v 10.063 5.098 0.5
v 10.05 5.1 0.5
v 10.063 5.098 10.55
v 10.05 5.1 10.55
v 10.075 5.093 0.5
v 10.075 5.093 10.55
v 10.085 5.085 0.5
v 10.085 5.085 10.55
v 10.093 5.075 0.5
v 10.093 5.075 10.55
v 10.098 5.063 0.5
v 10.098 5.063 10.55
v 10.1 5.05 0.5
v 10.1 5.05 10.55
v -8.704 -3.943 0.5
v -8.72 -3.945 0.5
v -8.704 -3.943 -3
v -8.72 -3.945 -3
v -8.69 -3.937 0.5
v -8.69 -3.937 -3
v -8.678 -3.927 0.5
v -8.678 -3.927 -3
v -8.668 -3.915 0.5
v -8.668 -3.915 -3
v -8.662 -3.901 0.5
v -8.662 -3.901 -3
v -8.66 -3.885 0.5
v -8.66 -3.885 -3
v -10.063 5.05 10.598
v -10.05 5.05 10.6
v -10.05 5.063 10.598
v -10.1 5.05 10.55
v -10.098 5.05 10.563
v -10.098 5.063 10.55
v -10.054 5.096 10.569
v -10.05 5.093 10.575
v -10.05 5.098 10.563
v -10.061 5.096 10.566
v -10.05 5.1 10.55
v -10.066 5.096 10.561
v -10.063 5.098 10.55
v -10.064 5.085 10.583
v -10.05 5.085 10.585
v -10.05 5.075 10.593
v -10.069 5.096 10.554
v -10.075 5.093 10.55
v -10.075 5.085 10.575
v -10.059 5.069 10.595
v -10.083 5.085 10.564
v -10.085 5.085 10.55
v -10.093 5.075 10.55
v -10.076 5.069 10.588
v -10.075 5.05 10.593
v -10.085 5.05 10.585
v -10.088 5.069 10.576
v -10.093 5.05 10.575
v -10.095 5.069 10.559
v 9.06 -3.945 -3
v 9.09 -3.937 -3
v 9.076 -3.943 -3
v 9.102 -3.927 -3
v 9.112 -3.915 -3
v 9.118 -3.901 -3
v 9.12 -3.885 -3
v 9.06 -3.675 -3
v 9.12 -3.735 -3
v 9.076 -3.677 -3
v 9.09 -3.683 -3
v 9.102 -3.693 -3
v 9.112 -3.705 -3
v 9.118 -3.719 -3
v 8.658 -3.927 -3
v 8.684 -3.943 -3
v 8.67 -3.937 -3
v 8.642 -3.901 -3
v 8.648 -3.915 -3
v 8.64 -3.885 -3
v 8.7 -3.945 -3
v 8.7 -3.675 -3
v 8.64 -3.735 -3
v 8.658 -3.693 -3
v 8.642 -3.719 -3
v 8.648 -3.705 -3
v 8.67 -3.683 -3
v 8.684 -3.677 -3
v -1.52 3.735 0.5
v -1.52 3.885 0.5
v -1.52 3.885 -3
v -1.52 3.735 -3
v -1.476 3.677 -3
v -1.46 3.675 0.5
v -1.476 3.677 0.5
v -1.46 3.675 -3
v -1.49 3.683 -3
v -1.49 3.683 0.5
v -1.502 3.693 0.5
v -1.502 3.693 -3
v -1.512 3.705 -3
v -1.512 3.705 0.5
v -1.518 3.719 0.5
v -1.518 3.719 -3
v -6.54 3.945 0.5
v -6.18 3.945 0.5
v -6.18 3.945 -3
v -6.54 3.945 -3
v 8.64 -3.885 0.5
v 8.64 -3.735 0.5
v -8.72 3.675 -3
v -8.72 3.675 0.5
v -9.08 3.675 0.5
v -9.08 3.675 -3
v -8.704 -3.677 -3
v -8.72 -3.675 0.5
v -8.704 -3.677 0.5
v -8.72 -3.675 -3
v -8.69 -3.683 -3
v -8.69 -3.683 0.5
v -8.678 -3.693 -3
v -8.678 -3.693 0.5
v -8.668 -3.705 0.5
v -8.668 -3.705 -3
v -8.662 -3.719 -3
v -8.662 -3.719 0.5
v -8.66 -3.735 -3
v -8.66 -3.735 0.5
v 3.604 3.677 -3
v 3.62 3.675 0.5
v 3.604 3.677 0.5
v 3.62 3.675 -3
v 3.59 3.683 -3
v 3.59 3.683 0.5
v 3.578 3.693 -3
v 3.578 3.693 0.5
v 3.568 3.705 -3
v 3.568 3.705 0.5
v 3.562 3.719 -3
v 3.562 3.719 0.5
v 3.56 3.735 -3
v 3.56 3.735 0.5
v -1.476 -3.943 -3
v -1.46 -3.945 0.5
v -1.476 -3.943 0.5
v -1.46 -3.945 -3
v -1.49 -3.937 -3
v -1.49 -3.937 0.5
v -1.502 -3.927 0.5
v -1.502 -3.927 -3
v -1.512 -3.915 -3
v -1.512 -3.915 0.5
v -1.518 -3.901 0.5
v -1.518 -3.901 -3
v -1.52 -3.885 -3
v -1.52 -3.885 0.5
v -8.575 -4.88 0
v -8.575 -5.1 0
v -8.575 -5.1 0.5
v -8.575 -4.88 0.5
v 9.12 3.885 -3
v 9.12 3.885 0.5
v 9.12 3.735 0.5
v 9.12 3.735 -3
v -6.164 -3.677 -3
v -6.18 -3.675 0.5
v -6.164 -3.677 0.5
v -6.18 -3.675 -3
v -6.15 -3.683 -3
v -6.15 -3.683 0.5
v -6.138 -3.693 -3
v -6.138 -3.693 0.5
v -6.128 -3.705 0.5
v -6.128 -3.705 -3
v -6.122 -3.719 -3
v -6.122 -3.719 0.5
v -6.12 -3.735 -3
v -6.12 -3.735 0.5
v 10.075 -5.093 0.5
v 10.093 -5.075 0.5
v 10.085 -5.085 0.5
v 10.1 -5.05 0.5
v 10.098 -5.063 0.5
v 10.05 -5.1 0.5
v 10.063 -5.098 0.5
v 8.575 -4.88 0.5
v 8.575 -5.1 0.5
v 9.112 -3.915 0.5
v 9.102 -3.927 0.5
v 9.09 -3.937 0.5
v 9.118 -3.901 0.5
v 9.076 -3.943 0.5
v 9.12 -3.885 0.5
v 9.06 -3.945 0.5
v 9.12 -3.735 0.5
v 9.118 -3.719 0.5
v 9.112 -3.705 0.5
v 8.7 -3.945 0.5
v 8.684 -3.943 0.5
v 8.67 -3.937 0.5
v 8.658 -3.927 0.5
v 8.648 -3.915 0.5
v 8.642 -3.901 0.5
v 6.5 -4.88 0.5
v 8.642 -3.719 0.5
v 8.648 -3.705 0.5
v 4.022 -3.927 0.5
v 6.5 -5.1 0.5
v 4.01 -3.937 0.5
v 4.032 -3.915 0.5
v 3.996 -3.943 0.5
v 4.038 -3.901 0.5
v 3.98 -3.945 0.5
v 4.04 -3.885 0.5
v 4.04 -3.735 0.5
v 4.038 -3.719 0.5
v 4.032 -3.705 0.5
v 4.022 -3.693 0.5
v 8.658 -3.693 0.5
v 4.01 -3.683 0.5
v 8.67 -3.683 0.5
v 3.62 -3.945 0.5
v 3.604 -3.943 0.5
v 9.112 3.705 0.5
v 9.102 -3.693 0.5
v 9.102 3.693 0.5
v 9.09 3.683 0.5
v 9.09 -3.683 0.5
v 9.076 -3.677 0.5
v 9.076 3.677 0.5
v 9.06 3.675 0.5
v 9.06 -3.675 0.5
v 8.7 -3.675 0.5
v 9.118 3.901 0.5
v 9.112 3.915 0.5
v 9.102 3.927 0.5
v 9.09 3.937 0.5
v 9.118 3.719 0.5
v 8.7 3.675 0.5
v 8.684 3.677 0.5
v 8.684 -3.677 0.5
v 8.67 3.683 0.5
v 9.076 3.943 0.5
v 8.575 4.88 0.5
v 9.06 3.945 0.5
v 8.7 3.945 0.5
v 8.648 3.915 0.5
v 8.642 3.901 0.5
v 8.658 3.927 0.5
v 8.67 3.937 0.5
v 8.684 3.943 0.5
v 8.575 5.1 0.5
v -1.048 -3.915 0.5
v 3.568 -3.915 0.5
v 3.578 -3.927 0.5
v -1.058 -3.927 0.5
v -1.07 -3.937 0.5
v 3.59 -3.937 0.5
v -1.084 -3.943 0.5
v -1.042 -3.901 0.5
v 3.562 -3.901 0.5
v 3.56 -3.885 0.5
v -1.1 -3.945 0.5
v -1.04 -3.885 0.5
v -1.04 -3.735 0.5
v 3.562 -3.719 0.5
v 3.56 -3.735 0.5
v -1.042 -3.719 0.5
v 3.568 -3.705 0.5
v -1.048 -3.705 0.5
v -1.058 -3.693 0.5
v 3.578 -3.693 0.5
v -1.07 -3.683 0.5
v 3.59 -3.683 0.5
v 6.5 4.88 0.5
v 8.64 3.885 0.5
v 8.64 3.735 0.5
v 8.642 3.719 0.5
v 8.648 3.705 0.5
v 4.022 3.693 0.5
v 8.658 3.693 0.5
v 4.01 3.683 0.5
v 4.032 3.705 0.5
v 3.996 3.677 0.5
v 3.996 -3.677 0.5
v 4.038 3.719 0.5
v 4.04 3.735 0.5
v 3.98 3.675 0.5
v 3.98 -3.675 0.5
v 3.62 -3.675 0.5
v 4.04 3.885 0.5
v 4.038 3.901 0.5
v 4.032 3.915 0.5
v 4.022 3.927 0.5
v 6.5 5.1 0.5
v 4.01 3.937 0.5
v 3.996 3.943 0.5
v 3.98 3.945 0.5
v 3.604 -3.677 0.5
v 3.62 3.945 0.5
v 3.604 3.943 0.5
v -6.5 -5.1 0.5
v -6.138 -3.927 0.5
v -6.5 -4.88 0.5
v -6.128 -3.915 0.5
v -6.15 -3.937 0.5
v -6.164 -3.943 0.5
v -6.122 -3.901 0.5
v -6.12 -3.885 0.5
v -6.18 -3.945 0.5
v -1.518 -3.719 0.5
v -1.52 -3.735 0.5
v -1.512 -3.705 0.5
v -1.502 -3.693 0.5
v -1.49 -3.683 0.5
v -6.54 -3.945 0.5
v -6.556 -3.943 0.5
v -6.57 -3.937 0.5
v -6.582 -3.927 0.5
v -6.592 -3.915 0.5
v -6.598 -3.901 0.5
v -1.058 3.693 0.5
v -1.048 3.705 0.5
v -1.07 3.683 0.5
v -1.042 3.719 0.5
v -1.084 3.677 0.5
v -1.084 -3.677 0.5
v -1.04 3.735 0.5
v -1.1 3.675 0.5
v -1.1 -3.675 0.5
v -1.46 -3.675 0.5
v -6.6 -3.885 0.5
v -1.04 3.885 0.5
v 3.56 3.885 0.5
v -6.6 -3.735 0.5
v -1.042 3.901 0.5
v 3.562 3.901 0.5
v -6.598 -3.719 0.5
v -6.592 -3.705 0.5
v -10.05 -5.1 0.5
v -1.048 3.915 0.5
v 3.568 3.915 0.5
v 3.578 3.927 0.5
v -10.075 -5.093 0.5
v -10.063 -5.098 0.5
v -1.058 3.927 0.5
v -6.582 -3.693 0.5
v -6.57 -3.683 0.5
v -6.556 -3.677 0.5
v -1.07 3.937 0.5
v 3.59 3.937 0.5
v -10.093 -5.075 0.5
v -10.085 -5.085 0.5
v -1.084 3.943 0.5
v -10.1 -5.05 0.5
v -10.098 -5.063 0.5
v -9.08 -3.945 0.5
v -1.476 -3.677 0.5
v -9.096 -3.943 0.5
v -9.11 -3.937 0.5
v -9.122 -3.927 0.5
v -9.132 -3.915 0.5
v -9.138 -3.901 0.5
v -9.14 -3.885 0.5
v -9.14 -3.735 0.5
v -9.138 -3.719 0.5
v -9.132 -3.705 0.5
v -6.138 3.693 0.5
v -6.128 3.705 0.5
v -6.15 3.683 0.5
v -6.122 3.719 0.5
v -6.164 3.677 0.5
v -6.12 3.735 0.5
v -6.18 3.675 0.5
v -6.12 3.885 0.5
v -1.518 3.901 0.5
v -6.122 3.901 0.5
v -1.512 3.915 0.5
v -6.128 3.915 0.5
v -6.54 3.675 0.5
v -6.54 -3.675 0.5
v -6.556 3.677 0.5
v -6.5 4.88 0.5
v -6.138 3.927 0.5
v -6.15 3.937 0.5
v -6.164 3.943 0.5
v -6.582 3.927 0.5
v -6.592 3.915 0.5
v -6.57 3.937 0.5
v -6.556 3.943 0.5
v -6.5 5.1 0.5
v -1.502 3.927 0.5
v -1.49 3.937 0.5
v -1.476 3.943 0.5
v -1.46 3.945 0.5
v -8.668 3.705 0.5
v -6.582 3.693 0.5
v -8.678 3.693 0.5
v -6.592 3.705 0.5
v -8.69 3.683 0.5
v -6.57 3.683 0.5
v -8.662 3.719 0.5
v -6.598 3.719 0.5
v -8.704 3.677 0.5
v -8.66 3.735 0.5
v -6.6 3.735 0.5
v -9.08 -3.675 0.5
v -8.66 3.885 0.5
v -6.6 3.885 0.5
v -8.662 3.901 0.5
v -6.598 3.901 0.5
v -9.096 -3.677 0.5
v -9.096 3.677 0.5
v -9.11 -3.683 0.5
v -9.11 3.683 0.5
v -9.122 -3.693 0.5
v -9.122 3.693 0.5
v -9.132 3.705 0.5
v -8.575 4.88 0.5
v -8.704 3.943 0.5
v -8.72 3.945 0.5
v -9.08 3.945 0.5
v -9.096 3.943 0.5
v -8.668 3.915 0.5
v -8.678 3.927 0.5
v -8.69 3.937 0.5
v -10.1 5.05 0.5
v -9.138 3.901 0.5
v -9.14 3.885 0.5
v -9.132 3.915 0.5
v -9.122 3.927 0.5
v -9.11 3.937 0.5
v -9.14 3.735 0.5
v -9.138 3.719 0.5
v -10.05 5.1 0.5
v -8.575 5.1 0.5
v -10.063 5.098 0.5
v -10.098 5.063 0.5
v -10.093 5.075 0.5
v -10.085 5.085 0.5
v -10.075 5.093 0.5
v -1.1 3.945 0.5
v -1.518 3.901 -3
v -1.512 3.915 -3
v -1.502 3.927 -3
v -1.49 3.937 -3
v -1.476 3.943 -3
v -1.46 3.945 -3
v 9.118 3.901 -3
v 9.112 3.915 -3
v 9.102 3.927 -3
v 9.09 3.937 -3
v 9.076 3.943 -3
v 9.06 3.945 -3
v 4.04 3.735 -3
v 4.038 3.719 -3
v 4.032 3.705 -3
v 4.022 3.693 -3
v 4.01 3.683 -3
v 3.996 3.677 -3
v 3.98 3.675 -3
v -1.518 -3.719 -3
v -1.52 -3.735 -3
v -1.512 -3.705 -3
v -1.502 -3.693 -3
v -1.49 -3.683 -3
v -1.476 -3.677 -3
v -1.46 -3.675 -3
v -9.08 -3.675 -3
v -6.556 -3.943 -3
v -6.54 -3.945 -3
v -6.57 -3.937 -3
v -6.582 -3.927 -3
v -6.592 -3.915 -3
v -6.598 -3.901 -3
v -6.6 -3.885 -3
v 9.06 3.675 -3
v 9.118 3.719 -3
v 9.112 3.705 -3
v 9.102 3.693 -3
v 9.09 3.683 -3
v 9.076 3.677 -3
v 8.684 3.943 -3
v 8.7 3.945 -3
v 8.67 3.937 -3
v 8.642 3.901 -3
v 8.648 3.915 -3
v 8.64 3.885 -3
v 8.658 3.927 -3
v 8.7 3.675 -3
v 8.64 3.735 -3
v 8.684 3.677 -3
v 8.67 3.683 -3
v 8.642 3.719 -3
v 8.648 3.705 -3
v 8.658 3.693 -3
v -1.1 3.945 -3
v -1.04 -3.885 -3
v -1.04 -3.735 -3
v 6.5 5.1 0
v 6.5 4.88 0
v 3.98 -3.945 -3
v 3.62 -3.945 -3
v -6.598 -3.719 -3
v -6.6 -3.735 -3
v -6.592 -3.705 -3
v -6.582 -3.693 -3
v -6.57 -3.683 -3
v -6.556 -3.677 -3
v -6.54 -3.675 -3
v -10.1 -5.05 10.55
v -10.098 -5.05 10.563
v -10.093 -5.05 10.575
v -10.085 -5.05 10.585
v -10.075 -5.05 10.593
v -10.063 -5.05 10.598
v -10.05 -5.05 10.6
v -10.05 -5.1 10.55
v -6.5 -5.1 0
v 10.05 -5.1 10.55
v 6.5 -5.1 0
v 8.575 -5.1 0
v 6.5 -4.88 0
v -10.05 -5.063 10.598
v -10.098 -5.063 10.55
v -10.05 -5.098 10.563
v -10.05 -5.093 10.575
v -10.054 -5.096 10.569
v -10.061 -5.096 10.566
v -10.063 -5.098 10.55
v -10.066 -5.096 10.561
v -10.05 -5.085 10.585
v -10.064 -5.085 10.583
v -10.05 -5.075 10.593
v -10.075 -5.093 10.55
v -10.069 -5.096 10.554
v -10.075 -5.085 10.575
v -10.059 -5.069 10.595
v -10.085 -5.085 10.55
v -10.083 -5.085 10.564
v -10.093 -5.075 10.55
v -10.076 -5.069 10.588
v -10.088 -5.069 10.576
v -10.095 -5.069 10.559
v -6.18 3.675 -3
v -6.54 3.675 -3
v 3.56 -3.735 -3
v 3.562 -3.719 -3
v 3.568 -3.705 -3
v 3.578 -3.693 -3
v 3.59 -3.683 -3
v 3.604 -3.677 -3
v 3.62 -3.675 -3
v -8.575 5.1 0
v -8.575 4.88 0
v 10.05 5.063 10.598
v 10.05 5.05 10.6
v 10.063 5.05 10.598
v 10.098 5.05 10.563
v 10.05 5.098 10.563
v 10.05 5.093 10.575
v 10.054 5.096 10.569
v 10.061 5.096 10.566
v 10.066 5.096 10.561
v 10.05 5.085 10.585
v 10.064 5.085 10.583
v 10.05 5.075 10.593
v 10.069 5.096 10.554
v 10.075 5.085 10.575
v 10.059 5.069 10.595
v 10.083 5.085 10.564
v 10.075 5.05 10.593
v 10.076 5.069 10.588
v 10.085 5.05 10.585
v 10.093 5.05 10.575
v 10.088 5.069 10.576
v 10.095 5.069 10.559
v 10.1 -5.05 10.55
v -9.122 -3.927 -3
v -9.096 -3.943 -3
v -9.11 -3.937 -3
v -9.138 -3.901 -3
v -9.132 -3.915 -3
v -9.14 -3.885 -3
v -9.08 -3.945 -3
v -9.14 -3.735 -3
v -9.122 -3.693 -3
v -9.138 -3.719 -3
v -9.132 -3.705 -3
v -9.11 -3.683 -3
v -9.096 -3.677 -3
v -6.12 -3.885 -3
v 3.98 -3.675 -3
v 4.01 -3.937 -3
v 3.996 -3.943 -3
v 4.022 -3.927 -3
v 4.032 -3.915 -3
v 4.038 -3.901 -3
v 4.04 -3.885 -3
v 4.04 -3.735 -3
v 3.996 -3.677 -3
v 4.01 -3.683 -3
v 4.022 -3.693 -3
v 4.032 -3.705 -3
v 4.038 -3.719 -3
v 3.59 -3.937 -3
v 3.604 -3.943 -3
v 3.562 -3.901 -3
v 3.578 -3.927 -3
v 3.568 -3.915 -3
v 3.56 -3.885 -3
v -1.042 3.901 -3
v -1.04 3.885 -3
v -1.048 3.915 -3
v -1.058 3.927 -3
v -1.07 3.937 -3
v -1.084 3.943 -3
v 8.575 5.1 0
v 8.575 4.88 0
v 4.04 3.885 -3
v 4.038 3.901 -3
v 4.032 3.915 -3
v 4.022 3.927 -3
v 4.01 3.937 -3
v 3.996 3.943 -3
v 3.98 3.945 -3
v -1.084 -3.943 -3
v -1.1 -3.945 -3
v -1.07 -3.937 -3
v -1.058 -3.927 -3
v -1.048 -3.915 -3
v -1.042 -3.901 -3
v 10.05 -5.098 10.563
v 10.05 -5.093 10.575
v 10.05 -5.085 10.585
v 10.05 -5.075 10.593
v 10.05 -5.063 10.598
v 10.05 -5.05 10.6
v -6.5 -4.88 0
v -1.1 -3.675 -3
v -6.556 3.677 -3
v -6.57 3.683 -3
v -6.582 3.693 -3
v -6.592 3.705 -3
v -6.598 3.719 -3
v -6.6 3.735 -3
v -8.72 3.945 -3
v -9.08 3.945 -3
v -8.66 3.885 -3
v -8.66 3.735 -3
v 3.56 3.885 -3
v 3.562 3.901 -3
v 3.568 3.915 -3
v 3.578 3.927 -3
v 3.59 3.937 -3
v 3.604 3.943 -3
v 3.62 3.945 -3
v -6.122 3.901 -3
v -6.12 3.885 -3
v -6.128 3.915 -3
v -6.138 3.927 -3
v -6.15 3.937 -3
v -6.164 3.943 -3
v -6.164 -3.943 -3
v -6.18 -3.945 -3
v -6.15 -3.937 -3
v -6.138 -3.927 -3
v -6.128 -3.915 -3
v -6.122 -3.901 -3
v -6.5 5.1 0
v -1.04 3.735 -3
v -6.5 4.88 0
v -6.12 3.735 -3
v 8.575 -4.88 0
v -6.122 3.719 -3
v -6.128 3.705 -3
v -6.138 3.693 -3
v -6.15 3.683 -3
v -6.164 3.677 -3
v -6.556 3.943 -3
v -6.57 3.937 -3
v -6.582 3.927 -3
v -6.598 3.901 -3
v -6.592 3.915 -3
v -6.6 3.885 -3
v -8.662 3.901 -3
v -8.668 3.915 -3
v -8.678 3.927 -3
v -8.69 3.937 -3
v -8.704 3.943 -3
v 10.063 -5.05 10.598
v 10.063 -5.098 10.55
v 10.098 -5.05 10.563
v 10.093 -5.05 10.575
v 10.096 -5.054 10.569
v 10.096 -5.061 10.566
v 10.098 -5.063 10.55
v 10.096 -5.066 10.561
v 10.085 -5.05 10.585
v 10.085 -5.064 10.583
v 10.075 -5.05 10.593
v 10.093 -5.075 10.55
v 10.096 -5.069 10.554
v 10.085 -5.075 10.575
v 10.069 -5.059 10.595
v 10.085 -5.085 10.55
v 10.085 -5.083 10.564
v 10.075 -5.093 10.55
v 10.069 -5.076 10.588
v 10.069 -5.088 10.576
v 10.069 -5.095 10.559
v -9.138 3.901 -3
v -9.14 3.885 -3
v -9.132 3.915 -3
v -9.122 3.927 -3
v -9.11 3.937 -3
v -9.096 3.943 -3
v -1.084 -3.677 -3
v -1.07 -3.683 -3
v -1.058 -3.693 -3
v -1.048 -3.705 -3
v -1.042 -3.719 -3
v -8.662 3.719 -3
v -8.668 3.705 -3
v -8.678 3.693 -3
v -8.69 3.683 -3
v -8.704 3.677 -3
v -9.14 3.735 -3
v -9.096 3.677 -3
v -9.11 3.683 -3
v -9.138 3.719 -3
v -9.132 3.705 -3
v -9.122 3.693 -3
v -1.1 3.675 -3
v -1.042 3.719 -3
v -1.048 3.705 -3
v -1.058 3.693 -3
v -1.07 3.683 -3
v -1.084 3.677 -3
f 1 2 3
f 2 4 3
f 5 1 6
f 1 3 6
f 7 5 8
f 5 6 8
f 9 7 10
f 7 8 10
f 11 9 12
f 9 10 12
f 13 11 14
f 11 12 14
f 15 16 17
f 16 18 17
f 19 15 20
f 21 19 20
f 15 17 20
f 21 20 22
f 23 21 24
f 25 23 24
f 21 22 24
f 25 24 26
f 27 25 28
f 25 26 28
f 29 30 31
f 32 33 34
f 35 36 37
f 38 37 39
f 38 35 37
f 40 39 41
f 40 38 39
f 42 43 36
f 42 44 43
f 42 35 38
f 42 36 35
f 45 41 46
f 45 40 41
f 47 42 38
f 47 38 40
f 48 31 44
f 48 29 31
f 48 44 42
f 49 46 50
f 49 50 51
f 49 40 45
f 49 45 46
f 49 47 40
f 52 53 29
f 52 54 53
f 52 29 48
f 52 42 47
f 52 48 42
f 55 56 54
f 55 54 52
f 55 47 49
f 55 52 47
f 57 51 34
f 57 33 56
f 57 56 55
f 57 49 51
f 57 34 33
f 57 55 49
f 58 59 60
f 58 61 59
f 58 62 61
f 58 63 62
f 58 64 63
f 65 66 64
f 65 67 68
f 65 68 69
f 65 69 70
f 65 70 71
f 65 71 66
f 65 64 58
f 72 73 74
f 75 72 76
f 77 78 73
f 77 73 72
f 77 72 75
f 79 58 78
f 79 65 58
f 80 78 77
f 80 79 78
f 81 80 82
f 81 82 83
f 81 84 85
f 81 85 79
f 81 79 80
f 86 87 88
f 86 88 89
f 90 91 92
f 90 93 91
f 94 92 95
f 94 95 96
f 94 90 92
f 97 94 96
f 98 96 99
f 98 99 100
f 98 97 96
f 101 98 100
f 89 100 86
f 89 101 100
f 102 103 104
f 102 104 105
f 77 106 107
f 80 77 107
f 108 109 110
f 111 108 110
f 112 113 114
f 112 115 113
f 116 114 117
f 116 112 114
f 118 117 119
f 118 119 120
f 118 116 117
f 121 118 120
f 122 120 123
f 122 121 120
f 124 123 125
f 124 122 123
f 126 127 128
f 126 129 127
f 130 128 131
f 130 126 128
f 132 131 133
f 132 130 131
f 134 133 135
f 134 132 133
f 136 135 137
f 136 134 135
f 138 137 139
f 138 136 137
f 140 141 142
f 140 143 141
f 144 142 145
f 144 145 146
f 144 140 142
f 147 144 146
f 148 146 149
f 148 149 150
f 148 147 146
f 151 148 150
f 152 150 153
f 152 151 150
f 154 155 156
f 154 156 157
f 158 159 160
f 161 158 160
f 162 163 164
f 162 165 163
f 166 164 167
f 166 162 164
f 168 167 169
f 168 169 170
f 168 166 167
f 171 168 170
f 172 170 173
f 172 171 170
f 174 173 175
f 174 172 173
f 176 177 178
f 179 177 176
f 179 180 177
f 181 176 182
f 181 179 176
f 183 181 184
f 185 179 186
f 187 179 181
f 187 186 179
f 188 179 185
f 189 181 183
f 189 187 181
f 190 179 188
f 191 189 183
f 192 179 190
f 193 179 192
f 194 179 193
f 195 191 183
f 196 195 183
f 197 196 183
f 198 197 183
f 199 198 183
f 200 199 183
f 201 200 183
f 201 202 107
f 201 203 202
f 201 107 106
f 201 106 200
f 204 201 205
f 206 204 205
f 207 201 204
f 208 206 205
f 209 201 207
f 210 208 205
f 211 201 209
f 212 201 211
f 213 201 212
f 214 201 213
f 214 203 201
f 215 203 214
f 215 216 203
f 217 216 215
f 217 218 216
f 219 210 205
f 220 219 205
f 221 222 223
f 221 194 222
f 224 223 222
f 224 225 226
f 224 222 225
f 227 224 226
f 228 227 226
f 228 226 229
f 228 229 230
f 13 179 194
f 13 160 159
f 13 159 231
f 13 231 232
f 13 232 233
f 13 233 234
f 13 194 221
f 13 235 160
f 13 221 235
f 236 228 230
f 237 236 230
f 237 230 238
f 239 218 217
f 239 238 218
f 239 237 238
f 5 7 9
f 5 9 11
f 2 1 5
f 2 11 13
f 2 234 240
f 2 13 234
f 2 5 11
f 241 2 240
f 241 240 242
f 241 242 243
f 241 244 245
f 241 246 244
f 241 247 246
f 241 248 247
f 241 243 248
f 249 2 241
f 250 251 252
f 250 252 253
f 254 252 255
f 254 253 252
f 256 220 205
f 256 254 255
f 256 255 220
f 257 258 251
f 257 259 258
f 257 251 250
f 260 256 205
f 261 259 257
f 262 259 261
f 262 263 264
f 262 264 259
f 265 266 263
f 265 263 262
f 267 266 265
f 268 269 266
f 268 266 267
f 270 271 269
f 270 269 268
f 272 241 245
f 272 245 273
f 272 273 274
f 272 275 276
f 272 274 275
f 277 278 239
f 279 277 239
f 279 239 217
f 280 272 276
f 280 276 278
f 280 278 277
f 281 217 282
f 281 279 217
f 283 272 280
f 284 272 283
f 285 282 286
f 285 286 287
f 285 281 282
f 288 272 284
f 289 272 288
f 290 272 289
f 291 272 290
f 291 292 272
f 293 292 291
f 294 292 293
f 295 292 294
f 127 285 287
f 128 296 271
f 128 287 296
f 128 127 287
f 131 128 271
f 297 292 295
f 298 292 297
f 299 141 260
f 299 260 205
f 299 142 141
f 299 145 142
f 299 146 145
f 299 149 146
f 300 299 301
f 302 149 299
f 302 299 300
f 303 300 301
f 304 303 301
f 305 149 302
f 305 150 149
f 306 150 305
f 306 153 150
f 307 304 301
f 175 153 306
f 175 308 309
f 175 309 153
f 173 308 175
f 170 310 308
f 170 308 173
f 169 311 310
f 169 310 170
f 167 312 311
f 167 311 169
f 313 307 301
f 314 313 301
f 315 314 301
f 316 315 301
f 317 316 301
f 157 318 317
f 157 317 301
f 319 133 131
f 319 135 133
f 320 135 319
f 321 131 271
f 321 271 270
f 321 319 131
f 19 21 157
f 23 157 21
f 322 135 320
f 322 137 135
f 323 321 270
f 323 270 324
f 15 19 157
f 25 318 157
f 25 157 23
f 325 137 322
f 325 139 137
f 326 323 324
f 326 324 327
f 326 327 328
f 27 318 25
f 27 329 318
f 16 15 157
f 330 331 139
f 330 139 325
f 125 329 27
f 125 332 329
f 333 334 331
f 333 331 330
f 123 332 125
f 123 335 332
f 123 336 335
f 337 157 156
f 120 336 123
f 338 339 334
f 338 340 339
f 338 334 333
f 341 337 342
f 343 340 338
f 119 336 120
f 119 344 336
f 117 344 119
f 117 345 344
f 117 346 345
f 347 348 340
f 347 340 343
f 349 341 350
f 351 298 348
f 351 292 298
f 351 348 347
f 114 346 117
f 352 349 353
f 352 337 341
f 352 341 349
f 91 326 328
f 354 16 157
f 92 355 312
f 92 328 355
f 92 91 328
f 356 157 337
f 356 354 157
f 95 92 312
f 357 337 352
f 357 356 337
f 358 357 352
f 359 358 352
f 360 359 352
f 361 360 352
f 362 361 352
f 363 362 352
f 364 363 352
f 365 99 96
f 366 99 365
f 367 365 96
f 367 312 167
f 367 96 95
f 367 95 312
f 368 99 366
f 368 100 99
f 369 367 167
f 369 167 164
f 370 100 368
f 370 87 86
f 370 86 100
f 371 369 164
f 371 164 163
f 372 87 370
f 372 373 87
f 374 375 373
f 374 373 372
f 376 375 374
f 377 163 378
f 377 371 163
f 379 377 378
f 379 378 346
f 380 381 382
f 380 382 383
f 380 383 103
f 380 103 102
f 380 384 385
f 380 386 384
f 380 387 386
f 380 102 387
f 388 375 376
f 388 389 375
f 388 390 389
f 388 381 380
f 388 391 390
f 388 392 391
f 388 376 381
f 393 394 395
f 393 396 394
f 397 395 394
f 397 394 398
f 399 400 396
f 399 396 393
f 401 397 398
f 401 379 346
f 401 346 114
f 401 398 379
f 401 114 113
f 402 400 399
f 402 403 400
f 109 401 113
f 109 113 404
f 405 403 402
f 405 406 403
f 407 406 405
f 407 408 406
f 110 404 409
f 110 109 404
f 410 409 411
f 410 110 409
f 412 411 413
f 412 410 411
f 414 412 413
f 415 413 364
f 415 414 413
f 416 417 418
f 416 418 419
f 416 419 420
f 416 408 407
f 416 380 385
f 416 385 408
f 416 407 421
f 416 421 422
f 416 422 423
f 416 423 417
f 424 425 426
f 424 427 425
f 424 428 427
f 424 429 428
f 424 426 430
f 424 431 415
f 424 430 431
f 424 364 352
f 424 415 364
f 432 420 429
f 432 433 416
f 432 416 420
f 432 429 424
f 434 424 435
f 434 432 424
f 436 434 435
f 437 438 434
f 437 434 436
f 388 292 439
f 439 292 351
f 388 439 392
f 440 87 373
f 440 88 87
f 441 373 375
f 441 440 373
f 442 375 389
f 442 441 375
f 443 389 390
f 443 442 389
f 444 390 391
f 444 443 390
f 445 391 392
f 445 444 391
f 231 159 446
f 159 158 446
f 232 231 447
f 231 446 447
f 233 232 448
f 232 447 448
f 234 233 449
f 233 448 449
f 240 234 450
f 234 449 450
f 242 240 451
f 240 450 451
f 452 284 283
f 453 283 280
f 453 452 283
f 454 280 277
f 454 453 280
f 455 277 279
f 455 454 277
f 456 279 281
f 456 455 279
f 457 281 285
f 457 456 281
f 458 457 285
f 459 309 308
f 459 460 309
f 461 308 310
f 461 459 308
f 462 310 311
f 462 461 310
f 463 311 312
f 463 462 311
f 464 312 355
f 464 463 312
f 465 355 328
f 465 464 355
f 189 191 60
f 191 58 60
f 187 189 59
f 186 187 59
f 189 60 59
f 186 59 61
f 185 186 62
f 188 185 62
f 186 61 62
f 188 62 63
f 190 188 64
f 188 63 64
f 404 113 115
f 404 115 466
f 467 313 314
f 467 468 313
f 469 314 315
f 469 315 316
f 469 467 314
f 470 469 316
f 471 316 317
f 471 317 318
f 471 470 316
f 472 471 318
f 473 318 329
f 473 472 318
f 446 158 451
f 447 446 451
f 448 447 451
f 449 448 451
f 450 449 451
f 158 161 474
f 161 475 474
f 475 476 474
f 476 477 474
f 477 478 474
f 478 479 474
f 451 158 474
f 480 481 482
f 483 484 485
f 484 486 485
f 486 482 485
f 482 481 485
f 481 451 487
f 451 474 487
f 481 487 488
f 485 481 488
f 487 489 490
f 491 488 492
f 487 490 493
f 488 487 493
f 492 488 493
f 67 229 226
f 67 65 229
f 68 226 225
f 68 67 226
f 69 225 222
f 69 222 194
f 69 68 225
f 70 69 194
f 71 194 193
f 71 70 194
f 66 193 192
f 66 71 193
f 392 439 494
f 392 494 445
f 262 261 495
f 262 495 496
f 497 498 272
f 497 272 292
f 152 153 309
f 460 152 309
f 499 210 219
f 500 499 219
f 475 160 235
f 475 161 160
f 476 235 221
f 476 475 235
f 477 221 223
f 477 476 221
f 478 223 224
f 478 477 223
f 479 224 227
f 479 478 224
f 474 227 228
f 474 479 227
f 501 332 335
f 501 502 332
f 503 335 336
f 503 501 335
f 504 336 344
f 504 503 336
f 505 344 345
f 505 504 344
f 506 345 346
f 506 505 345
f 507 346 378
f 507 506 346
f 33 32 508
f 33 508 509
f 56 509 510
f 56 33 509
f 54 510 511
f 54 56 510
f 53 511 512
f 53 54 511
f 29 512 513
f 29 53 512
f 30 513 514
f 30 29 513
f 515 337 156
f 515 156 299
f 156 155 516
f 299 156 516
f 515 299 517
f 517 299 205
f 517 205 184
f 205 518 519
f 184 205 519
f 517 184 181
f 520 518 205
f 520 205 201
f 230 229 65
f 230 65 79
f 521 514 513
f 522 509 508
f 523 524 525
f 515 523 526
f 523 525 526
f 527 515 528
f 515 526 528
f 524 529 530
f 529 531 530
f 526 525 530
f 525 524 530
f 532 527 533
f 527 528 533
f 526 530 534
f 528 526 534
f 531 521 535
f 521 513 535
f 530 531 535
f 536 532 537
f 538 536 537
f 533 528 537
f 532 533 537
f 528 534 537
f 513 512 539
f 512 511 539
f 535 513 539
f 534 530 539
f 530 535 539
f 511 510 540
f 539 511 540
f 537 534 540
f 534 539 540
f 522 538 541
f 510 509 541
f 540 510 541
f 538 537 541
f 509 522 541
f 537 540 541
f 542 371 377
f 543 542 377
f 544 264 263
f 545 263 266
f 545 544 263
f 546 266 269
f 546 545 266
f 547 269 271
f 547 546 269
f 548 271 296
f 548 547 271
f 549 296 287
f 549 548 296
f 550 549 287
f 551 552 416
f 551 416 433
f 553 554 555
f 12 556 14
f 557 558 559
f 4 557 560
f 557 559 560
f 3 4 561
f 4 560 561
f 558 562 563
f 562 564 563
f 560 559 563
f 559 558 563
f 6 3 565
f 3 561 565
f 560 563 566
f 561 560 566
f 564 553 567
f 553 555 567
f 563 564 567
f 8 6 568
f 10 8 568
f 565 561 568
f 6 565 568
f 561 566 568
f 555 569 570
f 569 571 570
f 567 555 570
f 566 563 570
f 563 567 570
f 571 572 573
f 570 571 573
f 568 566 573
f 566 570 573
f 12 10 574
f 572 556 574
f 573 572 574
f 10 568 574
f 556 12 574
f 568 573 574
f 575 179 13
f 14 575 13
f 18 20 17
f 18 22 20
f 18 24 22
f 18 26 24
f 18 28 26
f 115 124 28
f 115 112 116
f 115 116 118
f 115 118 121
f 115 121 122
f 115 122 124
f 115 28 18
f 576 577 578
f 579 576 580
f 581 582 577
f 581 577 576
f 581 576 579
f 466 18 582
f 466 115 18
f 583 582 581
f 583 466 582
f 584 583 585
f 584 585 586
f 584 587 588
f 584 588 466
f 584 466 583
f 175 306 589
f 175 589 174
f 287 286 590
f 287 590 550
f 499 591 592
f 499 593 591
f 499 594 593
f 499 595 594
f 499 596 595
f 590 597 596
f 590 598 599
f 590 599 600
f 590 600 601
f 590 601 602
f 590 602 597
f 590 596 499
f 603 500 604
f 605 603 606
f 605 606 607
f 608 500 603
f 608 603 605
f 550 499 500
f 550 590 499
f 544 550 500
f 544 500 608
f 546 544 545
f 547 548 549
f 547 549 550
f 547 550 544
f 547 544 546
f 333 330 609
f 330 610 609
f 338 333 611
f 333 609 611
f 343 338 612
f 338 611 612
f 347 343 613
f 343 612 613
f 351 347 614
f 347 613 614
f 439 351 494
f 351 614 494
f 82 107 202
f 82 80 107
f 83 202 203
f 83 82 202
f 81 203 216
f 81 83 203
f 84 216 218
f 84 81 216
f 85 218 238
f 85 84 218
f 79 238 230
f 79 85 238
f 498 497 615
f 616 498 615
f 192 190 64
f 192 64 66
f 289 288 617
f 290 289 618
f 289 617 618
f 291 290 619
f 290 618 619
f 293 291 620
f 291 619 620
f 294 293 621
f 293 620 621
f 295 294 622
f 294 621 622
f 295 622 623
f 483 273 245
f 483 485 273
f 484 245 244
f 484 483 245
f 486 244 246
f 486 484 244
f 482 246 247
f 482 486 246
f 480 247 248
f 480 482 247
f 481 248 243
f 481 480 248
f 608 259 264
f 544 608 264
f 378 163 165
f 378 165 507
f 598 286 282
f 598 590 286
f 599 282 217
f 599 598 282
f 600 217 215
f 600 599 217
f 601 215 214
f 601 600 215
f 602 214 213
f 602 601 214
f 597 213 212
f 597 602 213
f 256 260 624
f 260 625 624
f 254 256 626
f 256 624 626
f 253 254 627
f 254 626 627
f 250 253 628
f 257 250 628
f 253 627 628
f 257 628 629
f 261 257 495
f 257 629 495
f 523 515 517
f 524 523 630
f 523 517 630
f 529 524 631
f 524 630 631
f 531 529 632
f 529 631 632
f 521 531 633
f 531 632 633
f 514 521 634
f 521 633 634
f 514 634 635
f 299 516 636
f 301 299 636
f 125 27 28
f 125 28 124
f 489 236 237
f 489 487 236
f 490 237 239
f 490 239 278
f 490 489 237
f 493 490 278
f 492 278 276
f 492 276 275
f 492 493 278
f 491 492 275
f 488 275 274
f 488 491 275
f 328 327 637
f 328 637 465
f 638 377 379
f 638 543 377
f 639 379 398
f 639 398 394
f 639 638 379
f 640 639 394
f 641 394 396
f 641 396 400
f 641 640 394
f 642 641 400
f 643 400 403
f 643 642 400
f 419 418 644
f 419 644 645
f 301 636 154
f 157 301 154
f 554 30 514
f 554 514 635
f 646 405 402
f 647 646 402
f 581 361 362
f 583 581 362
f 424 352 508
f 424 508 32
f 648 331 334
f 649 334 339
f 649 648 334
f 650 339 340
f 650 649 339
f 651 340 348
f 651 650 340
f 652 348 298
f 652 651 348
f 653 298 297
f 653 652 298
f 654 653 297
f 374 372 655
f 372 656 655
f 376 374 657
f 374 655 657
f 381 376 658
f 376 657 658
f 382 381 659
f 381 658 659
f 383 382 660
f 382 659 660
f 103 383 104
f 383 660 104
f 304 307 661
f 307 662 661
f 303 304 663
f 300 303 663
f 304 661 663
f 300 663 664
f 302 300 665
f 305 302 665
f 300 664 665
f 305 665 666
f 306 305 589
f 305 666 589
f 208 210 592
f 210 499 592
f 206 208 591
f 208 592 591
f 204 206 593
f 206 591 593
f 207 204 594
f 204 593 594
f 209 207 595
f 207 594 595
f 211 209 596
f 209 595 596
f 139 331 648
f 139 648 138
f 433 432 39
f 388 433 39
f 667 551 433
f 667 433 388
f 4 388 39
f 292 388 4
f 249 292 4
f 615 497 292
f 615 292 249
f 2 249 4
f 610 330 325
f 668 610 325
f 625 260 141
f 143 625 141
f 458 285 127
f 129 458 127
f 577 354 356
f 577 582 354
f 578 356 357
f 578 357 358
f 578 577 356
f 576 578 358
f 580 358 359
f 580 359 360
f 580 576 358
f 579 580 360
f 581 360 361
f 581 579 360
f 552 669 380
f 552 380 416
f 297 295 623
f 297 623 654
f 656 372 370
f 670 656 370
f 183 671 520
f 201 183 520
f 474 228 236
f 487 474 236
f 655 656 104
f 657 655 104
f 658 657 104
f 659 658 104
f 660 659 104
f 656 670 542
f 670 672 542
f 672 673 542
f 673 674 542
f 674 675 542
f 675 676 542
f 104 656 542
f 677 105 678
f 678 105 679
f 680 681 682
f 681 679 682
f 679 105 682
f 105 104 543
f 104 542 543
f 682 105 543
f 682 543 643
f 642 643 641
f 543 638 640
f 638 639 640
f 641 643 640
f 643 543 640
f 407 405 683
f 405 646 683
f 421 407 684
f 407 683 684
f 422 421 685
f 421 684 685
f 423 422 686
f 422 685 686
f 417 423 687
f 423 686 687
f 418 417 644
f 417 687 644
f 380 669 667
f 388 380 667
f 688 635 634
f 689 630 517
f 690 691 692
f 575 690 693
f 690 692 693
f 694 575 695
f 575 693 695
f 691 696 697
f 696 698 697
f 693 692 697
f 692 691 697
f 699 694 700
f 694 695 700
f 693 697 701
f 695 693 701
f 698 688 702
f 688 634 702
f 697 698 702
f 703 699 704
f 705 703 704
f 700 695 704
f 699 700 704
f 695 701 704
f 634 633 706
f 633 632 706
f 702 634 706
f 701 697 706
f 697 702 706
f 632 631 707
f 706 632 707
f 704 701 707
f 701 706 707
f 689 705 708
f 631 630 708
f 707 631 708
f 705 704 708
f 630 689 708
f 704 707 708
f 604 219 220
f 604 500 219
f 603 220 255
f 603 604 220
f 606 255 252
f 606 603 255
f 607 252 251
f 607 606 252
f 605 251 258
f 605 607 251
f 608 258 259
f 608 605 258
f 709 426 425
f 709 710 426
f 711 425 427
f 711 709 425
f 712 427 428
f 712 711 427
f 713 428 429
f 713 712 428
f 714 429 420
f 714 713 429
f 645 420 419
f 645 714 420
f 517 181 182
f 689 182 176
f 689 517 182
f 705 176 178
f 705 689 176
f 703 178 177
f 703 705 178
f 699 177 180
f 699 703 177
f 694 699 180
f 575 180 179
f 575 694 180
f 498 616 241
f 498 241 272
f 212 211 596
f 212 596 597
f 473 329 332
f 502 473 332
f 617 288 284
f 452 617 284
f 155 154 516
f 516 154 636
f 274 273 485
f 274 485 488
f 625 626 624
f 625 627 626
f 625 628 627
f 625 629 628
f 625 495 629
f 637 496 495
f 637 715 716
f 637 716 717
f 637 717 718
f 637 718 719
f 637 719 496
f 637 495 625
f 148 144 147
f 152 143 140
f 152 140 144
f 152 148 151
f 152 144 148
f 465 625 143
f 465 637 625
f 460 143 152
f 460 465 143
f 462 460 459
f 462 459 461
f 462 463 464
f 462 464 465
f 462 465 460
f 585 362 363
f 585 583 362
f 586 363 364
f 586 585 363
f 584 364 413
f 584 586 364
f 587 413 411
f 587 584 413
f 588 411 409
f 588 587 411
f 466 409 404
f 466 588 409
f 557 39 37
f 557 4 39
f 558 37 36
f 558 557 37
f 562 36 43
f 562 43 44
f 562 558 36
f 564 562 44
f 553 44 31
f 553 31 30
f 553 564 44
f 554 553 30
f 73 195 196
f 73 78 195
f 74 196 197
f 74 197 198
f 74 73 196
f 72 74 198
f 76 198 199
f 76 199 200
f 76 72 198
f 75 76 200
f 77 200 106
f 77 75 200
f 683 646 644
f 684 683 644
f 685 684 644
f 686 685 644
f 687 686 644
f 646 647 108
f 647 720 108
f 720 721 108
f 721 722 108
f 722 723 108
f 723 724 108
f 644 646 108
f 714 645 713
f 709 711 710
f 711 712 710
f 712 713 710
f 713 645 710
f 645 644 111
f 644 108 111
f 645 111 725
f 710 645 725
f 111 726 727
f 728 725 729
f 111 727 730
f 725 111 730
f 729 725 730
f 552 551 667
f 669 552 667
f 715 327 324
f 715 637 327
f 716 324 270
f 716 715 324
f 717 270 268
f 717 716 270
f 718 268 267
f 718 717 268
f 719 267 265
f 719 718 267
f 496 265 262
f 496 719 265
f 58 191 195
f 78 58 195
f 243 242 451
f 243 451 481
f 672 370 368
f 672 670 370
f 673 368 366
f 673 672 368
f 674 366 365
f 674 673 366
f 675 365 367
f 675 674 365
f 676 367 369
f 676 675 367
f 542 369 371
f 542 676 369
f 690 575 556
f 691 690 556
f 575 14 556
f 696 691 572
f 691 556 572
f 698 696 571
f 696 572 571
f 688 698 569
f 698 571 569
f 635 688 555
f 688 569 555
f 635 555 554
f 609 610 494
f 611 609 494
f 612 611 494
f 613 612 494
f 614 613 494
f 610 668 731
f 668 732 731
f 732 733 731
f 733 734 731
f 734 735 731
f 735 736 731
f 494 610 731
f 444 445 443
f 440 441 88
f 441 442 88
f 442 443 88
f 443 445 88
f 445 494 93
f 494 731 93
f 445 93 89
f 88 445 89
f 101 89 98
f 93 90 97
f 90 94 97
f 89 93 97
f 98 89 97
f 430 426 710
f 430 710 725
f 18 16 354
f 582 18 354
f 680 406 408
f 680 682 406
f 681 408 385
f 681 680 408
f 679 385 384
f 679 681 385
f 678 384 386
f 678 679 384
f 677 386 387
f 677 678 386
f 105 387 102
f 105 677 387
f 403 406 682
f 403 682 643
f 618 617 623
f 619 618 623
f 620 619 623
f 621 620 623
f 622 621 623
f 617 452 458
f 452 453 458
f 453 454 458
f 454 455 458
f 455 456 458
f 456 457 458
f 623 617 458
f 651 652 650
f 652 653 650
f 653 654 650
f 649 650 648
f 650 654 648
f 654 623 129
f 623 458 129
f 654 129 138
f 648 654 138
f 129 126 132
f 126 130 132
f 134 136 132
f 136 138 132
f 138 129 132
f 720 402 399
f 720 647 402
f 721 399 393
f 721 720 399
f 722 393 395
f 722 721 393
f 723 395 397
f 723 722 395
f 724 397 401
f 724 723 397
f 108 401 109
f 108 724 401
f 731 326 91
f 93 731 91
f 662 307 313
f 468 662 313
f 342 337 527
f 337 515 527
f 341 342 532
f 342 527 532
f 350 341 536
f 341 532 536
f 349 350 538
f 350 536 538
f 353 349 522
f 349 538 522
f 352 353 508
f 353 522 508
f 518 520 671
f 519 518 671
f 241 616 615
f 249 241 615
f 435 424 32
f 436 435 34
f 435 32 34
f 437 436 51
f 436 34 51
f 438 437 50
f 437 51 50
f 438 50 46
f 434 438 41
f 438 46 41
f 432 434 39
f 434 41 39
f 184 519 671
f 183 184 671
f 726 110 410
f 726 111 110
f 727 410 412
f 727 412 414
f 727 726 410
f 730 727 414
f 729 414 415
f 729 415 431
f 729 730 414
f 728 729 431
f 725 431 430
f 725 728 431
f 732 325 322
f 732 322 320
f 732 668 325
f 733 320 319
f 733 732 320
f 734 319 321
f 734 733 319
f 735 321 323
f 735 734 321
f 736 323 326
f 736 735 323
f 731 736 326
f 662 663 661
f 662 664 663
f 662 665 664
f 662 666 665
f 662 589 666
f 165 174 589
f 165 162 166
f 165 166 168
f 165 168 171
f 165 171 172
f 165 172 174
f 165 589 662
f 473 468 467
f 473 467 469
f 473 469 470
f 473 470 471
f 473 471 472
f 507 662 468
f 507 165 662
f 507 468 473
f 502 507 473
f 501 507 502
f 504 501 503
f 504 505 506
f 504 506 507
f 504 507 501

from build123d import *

# Parameters (mm, degrees)
SKETCH1_W            = 20.2
SKETCH1_H            = 10.2
BOSS_EXTRUDE1_DEPTH  = 10.6
SKETCH2_W            = 13
SKETCH2_H            = 10.2
SKETCH2_W_2          = 1.525
CUT_EXTRUDE1_DEPTH   = 0.5
SKETCH3_W            = 17.15
SKETCH3_H            = 9.76
CUT_EXTRUDE2_DEPTH   = 0.5
SKETCH4_W            = 0.48
SKETCH4_H            = 0.27
BOSS_EXTRUDE2_DEPTH  = 3.5
FILLET1_R            = 0.06
FILLET1_OF_MIRROR1_R = 0.06
FILLET2_R            = 0.05


with BuildPart() as part:
    # Sketch1 → Boss-Extrude1 (new body)
    with BuildSketch(Plane.XY):
        Rectangle(SKETCH1_W, SKETCH1_H)
    extrude(amount=BOSS_EXTRUDE1_DEPTH)

    # Sketch2 → Cut-Extrude1 (cut)
    with BuildSketch(Plane(origin=(0, 0, 0), x_dir=(-1, 0, 0), z_dir=(0, 0, -1))):
        Rectangle(SKETCH2_W, SKETCH2_H)
        with Locations((-9.3375, 0)):
            Rectangle(SKETCH2_W_2, SKETCH2_H)
        with Locations((9.3375, 0)):
            Rectangle(SKETCH2_W_2, SKETCH2_H)
    extrude(amount=-CUT_EXTRUDE1_DEPTH, mode=Mode.SUBTRACT)

    # Sketch3 → Cut-Extrude2 (cut)
    with BuildSketch(Plane(origin=(0, 0, 0), x_dir=(-1, 0, 0), z_dir=(0, 0, -1))):
        Rectangle(SKETCH3_W, SKETCH3_H)
    extrude(amount=-CUT_EXTRUDE2_DEPTH, mode=Mode.SUBTRACT)

    # Sketch4 → Boss-Extrude2 (add)
    with BuildSketch(Plane(origin=(0, 0, 0.5), x_dir=(-1, 0, 0), z_dir=(0, 0, -1))):
        with Locations((8.9, -3.81)):
            Rectangle(SKETCH4_W, SKETCH4_H)
        with Locations((6.36, -3.81)):
            Rectangle(SKETCH4_W, SKETCH4_H)
        with Locations((1.28, -3.81)):
            Rectangle(SKETCH4_W, SKETCH4_H)
        with Locations((-3.8, -3.81)):
            Rectangle(SKETCH4_W, SKETCH4_H)
        with Locations((-8.88, -3.81)):
            Rectangle(SKETCH4_W, SKETCH4_H)
    boss_extrude2 = extrude(amount=BOSS_EXTRUDE2_DEPTH)

    # Fillet1
    fillet1_edges = [part.edges().sort_by_distance(p)[0] for p in [
        (-6.6, -3.675, -1.25),
        (-6.6, -3.945, -1.25),
        (-6.12, -3.945, -1.25),
        (-6.12, -3.675, -1.25),
        (-1.52, -3.675, -1.25),
        (-1.52, -3.945, -1.25),
        (-1.04, -3.945, -1.25),
        (-1.04, -3.675, -1.25),
        (3.56, -3.675, -1.25),
        (3.56, -3.945, -1.25),
        (4.04, -3.945, -1.25),
        (4.04, -3.675, -1.25),
        (8.64, -3.675, -1.25),
        (8.64, -3.945, -1.25),
        (9.12, -3.945, -1.25),
        (9.12, -3.675, -1.25),
        (-8.66, -3.945, -1.25),
        (-8.66, -3.675, -1.25),
        (-9.14, -3.675, -1.25),
        (-9.14, -3.945, -1.25),
    ]]
    fillet(fillet1_edges, radius=FILLET1_R)

    # Mirror1: Boss-Extrude2 across plane
    add(boss_extrude2.mirror(Plane.ZX))

    # Fillet1 of Mirror1
    fillet1_of_mirror1_edges = [part.edges().sort_by_distance(p)[0] for p in [
        (-6.6, 3.675, -1.25),
        (-6.6, 3.945, -1.25),
        (-6.12, 3.945, -1.25),
        (-6.12, 3.675, -1.25),
        (-1.52, 3.675, -1.25),
        (-1.52, 3.945, -1.25),
        (-1.04, 3.945, -1.25),
        (-1.04, 3.675, -1.25),
        (3.56, 3.675, -1.25),
        (3.56, 3.945, -1.25),
        (4.04, 3.945, -1.25),
        (4.04, 3.675, -1.25),
        (8.64, 3.675, -1.25),
        (8.64, 3.945, -1.25),
        (9.12, 3.945, -1.25),
        (9.12, 3.675, -1.25),
        (-8.66, 3.945, -1.25),
        (-8.66, 3.675, -1.25),
        (-9.14, 3.675, -1.25),
        (-9.14, 3.945, -1.25),
    ]]
    fillet(fillet1_of_mirror1_edges, radius=FILLET1_OF_MIRROR1_R)

    # Fillet2
    fillet2_edges = [part.edges().sort_by_distance(p)[0] for p in [
        (-10.1, 0, 10.6),
        (0, -5.1, 10.6),
        (10.1, 0, 10.6),
        (0, 5.1, 10.6),
        (10.1, -5.1, 5.55),
        (-10.1, -5.1, 5.55),
        (-10.1, 5.1, 5.55),
        (10.1, 5.1, 5.55),
    ]]
    fillet(fillet2_edges, radius=FILLET2_R)


solid = part.part
